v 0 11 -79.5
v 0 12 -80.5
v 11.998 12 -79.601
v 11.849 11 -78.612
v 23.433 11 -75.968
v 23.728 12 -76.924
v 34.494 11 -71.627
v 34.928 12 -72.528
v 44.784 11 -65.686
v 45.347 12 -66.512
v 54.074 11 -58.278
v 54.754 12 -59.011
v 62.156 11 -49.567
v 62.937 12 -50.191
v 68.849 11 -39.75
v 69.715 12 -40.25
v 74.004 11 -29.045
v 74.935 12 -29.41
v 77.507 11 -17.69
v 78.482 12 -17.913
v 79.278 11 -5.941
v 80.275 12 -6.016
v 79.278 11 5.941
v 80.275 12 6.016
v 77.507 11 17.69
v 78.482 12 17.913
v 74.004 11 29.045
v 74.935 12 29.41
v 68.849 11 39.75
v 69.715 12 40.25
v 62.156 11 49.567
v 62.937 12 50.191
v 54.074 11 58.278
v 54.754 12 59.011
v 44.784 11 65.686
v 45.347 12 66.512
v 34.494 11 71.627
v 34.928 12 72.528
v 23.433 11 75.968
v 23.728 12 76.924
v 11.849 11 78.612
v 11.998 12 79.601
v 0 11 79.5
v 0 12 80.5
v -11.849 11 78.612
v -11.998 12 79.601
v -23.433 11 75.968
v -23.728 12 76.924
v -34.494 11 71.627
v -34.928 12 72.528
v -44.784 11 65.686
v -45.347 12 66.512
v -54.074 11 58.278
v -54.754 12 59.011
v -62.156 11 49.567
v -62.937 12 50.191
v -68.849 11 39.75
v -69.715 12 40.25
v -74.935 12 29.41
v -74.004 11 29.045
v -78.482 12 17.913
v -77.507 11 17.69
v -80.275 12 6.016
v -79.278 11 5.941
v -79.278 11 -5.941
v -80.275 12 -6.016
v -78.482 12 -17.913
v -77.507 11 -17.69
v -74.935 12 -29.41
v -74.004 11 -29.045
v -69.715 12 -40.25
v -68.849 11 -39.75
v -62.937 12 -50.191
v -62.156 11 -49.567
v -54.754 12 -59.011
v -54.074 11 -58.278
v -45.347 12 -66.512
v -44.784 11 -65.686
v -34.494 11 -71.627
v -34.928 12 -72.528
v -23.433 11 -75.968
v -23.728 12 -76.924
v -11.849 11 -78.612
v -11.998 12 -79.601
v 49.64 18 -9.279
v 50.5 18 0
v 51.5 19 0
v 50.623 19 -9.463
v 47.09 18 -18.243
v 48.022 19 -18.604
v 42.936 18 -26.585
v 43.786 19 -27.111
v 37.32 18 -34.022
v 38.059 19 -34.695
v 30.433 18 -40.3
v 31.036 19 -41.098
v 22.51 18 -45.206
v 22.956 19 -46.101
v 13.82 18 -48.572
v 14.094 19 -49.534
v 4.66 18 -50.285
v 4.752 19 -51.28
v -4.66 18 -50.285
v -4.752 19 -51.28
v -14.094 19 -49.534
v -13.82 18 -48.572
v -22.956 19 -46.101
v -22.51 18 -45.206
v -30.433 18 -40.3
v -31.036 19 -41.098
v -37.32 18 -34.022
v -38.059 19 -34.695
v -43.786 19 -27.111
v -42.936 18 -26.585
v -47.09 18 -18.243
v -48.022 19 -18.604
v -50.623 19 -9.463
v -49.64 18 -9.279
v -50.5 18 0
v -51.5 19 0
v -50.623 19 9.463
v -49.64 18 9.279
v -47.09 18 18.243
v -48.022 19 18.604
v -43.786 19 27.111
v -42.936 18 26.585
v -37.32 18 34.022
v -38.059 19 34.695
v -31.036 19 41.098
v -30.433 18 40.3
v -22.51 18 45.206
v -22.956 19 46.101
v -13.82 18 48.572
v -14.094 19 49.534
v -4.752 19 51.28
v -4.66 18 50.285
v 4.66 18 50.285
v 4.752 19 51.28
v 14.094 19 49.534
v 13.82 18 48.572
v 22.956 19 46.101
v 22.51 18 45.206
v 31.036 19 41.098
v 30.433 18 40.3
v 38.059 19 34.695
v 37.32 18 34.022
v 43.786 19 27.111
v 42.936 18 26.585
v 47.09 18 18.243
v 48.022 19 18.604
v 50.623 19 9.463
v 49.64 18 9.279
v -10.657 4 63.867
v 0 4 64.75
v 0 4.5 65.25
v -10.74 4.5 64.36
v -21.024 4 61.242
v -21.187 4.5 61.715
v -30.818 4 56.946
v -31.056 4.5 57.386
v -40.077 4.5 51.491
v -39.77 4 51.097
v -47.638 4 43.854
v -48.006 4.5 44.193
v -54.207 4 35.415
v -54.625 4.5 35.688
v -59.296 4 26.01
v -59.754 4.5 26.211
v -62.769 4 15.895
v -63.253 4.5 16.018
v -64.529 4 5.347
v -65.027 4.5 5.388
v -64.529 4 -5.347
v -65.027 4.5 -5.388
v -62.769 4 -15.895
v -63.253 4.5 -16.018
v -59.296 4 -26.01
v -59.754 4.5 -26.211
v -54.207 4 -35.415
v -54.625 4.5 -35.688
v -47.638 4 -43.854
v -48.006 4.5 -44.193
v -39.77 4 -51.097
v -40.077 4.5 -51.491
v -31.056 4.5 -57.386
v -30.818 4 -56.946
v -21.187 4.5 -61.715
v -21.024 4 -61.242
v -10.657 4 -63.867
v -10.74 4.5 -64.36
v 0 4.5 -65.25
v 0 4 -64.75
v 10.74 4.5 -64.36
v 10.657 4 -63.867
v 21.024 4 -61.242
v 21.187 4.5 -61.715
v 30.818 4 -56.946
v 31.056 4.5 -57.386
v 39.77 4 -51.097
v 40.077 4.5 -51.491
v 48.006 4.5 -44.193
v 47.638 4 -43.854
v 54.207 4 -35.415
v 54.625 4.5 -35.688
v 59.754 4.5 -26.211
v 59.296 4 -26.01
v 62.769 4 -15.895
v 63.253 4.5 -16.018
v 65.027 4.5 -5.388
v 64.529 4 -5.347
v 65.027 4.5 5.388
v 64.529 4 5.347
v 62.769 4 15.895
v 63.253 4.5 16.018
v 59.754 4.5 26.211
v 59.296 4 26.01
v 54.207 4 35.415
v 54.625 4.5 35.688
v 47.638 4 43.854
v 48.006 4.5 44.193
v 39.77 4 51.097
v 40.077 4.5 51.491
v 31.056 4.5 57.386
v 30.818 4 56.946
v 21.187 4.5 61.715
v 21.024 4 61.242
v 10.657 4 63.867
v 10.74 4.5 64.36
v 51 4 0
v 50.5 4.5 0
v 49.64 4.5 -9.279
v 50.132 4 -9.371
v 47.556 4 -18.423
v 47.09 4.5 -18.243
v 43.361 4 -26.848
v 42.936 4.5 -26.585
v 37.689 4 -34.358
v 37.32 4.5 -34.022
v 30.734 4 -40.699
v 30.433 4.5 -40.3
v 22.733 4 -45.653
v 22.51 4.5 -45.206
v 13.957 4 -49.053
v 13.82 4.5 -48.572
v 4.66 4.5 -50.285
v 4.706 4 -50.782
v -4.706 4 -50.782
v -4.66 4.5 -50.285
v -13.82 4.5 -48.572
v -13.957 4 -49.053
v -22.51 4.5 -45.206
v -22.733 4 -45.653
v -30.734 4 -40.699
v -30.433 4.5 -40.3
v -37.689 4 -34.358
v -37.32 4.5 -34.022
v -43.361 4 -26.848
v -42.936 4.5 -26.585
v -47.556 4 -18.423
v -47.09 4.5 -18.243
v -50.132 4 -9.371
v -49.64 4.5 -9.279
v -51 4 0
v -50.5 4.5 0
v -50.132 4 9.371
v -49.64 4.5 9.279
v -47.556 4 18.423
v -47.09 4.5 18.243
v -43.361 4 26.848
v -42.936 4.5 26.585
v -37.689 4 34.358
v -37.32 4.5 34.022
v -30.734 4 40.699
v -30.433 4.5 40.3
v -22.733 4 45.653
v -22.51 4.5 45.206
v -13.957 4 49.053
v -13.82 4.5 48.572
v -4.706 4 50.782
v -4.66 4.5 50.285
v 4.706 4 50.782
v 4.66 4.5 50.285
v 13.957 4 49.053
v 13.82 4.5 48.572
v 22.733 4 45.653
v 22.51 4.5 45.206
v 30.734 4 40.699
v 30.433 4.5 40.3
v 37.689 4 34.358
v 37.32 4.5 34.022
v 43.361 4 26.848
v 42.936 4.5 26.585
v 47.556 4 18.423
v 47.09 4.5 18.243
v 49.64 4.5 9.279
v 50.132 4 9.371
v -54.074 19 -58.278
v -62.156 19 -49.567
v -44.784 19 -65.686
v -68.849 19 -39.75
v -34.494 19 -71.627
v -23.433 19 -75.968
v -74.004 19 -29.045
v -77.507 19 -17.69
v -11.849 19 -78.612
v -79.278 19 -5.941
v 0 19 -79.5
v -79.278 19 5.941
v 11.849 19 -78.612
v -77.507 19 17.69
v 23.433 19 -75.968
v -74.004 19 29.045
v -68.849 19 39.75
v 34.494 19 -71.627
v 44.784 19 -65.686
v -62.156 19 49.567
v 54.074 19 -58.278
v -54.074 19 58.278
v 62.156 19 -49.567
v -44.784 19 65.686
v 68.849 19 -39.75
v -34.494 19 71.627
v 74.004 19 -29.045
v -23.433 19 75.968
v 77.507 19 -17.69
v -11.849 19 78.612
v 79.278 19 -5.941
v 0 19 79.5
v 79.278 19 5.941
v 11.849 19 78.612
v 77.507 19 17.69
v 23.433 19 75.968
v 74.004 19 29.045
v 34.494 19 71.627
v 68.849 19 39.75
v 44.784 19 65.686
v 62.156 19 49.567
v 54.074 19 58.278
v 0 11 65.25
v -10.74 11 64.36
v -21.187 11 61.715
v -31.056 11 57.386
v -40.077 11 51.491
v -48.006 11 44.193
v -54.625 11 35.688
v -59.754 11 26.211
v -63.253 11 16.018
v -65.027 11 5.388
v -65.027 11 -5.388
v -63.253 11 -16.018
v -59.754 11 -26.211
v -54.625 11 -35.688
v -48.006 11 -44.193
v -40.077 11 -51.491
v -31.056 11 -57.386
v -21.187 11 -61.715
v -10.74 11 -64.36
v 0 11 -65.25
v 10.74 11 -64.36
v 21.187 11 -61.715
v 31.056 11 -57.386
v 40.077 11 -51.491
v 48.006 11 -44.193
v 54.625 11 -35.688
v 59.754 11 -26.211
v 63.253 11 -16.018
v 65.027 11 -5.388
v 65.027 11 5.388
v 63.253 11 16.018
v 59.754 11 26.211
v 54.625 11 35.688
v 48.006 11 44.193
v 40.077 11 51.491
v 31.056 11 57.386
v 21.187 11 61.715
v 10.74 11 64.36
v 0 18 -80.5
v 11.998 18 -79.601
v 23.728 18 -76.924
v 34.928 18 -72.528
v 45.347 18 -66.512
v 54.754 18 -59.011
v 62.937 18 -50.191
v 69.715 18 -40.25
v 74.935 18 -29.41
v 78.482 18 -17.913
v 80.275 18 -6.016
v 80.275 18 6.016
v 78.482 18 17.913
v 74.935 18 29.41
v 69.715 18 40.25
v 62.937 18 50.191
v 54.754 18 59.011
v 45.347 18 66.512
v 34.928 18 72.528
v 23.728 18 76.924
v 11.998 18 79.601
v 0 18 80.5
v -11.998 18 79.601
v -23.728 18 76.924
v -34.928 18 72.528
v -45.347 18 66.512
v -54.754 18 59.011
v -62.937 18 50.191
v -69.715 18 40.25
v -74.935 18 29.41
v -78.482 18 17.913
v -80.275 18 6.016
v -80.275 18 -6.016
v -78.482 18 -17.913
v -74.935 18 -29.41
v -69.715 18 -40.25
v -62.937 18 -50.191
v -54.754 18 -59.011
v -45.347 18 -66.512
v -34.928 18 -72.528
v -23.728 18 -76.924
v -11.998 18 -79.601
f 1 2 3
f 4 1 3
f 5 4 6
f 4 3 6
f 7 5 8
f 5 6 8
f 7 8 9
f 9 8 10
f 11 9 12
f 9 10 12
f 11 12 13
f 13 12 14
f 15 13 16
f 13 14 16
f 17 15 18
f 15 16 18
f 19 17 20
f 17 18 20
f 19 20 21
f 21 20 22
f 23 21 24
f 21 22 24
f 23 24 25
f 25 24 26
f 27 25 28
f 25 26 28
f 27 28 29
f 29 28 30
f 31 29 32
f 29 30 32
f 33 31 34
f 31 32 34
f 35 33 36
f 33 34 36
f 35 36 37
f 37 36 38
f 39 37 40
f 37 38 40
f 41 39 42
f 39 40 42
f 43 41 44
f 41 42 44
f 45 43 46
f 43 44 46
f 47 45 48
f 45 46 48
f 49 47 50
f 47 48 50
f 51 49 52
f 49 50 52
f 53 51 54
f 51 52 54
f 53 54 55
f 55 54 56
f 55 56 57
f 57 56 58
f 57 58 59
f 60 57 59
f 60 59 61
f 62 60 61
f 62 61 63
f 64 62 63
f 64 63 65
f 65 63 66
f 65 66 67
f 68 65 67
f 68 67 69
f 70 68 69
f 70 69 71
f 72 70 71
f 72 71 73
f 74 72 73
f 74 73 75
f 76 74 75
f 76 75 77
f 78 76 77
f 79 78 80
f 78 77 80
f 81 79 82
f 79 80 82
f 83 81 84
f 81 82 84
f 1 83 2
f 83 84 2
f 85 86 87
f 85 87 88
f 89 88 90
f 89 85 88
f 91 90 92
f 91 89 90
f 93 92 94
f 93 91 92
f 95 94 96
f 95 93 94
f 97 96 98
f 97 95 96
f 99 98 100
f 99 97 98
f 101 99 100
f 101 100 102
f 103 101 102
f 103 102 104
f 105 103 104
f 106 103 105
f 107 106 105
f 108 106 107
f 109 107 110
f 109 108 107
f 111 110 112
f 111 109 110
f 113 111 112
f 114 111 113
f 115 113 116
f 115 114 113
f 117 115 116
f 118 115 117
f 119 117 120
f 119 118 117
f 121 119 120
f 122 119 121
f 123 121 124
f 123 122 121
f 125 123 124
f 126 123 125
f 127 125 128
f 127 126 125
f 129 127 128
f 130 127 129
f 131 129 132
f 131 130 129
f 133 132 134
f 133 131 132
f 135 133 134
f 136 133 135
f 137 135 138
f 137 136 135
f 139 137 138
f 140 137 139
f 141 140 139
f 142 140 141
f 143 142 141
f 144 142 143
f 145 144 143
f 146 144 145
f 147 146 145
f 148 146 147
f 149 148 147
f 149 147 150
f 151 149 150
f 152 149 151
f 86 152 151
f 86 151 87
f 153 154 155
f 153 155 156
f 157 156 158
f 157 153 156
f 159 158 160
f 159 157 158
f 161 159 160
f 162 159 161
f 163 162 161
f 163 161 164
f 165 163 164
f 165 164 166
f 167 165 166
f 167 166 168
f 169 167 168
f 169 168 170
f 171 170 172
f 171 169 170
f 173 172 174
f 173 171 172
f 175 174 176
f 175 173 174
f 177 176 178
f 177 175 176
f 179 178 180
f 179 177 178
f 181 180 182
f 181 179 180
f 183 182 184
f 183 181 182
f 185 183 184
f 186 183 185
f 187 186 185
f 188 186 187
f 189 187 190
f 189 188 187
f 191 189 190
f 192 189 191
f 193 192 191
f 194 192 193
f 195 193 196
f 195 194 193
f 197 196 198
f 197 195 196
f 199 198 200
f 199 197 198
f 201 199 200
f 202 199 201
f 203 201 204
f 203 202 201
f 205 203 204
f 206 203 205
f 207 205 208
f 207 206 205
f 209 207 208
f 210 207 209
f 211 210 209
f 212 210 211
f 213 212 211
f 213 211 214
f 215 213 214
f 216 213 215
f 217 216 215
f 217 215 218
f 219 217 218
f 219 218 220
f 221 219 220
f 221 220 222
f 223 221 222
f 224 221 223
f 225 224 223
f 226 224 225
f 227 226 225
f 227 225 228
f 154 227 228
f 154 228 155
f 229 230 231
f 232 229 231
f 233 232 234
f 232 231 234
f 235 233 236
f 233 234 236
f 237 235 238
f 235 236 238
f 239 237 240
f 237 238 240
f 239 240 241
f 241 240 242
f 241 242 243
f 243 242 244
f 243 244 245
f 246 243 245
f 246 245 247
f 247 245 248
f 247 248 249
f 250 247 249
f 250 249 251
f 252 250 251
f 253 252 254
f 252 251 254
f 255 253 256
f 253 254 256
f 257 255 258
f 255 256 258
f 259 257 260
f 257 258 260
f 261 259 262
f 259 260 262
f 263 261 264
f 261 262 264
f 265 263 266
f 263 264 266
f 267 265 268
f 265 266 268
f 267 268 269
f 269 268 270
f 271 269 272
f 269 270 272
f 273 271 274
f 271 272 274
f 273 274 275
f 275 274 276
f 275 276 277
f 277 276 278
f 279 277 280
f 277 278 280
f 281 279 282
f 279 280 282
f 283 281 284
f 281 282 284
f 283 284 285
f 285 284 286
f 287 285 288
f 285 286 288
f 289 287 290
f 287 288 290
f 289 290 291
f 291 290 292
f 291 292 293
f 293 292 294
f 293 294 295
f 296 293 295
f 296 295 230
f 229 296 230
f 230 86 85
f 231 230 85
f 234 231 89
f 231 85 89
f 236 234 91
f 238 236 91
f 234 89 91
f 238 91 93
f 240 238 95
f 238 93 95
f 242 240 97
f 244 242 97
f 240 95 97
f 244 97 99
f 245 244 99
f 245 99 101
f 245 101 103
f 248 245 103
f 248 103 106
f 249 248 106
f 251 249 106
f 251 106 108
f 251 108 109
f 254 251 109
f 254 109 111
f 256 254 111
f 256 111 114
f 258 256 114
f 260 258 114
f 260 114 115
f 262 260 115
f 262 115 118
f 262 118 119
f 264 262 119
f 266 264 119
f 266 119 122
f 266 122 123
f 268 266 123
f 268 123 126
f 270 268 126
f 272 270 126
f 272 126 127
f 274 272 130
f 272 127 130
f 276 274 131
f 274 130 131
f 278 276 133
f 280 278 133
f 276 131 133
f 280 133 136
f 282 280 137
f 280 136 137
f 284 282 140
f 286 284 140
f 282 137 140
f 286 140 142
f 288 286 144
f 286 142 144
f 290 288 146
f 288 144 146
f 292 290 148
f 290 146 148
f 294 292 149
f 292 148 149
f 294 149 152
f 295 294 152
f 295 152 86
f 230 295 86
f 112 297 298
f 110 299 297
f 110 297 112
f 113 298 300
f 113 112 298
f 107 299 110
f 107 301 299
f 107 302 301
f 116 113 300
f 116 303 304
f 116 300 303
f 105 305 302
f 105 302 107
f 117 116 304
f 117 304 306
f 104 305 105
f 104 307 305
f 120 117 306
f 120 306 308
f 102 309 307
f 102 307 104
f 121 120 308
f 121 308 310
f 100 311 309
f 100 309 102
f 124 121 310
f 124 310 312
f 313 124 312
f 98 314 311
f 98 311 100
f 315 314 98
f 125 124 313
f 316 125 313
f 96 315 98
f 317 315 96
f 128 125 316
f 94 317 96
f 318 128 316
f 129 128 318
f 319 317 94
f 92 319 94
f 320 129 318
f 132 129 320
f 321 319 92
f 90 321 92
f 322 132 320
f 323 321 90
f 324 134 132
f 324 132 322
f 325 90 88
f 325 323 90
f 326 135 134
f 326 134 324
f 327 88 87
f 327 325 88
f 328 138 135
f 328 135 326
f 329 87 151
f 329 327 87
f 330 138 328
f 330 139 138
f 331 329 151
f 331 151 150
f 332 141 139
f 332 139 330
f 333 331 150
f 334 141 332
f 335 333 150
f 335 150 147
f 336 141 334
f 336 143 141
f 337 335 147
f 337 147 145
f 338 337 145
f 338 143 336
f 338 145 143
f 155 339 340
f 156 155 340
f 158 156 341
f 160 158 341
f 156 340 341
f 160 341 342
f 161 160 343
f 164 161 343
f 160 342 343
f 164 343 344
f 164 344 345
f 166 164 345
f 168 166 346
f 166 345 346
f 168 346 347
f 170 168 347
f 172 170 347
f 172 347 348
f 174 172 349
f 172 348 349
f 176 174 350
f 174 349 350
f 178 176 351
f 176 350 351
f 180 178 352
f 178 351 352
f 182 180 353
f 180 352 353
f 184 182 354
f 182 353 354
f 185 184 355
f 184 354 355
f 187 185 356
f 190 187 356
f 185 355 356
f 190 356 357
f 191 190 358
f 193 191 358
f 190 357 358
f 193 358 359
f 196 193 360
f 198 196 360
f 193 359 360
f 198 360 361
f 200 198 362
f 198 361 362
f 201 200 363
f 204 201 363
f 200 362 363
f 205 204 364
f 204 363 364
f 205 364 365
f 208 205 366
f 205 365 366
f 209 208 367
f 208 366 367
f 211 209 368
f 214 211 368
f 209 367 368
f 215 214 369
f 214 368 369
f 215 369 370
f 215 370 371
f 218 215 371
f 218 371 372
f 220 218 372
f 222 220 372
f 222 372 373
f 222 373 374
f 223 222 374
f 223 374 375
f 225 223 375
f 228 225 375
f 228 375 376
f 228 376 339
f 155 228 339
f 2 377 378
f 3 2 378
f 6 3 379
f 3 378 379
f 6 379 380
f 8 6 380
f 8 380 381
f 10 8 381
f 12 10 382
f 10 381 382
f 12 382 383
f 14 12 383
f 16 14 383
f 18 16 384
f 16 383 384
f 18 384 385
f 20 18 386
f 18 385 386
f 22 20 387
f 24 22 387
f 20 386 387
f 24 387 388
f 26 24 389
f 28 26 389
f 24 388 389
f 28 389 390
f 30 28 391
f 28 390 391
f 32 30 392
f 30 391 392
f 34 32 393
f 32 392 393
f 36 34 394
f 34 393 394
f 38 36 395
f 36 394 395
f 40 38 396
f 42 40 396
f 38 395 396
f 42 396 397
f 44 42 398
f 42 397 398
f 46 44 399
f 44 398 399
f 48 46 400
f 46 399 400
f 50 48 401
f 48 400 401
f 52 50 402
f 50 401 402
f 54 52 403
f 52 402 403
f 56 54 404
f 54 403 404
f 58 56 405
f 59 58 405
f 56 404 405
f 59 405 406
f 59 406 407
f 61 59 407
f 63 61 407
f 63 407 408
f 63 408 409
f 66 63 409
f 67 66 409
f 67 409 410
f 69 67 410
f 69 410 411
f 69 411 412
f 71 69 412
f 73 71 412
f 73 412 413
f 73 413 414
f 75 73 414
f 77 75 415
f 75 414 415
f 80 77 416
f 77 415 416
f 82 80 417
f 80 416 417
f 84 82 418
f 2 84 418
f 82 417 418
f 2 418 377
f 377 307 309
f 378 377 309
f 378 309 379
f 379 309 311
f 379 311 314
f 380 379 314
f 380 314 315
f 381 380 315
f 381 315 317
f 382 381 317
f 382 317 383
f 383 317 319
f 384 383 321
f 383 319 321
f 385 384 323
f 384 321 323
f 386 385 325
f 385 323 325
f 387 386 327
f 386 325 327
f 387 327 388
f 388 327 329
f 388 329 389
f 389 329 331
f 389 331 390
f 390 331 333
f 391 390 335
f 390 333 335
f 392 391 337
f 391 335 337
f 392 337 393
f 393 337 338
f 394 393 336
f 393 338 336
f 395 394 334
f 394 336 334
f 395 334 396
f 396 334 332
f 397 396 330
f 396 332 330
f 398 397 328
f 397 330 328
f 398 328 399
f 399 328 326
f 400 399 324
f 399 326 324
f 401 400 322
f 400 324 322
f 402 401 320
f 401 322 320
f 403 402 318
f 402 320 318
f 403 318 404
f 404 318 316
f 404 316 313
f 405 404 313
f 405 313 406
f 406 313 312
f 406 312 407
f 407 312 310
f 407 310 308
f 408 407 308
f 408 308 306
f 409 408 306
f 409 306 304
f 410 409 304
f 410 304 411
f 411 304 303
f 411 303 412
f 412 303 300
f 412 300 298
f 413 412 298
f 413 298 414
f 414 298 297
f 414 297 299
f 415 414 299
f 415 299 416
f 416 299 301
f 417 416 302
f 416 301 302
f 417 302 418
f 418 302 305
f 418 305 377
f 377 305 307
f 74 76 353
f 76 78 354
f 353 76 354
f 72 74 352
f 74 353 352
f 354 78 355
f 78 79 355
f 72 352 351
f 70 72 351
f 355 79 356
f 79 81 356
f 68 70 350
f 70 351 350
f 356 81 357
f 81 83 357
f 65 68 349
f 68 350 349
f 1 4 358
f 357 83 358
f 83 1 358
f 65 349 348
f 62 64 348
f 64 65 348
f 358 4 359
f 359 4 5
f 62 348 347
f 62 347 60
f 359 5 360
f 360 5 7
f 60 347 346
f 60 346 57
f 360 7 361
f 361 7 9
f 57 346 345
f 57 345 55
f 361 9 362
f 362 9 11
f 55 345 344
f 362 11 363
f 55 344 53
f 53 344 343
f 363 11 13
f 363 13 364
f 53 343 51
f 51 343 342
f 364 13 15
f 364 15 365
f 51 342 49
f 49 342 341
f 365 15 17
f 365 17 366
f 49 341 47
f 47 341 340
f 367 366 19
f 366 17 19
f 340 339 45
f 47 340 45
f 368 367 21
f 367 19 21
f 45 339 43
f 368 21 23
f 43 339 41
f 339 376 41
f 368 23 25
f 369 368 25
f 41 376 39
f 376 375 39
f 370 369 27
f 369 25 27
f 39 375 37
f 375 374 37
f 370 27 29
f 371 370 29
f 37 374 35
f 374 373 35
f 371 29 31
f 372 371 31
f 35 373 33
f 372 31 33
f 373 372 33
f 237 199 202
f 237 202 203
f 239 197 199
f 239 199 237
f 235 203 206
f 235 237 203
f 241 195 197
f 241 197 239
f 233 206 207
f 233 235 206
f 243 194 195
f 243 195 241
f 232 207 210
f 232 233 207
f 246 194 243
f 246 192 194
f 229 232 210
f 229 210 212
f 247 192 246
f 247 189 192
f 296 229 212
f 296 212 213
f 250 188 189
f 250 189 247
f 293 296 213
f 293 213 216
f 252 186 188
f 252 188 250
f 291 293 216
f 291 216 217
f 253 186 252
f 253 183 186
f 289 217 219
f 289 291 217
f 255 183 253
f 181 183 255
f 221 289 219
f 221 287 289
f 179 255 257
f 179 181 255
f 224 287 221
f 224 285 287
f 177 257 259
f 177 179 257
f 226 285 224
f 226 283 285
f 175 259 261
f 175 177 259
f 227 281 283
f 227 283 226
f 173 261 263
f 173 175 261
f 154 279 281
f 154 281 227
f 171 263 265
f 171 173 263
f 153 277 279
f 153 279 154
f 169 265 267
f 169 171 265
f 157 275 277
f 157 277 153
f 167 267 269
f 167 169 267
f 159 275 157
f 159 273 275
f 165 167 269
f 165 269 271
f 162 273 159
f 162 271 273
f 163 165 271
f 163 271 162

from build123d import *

# Parameters (mm, degrees)
SKETCH_1_W      = 80.5
SKETCH_1_H      = 8
SKETCH_2_R      = 65.25
EXTRUDE_1_DEPTH = 7
HOLE_WIZARD_3_D = 101
CHAMFER_1_SIZE  = 0.5
CHAMFER_2_SIZE2 = 1.000000001
CHAMFER_2_SIZE  = 0.999999999


with BuildPart() as part:
    # 草圖1 → 旋轉1 (revolve)
    with BuildSketch(Plane.XY, mode=Mode.PRIVATE) as revolve_1_sk:
        with Locations((40.25, 15)):
            Rectangle(SKETCH_1_W, SKETCH_1_H)
    revolve(revolve_1_sk.sketch.rotate(Axis((0, 19, 0), (0, -1, 0)), 270), axis=Axis((0, 19, 0), (0, -1, 0)))

    # 草圖2 → 填料-伸長1 (add)
    with BuildSketch(Plane.XZ.offset(-11)):
        with Locations(Location((0, 0, 0), (0, 0, 90))):
            Circle(SKETCH_2_R)
    extrude(amount=EXTRUDE_1_DEPTH)

    # 鑽孔3 (through all)
    with Locations(Plane(origin=(0, 4, 0), x_dir=(-1, 0, 0), z_dir=(0, -1, 0))):
        with Locations((0, 0)):
            Hole(HOLE_WIZARD_3_D / 2)

    # 導角1
    chamfer_1_edges = [part.edges().sort_by_distance(p)[0] for p in [
        (0, 4, -65.25),
        (-50.5, 4, 0),
    ]]
    chamfer(chamfer_1_edges, length=CHAMFER_1_SIZE)

    # 導角2
    chamfer_2_edges = [part.edges().sort_by_distance(p)[0] for p in [
        (-50.5, 19, 0),
        (0, 11, 80.5),
        (0, 19, 80.5),
    ]]
    chamfer(chamfer_2_edges, length=CHAMFER_2_SIZE, length2=CHAMFER_2_SIZE2)


solid = part.part
